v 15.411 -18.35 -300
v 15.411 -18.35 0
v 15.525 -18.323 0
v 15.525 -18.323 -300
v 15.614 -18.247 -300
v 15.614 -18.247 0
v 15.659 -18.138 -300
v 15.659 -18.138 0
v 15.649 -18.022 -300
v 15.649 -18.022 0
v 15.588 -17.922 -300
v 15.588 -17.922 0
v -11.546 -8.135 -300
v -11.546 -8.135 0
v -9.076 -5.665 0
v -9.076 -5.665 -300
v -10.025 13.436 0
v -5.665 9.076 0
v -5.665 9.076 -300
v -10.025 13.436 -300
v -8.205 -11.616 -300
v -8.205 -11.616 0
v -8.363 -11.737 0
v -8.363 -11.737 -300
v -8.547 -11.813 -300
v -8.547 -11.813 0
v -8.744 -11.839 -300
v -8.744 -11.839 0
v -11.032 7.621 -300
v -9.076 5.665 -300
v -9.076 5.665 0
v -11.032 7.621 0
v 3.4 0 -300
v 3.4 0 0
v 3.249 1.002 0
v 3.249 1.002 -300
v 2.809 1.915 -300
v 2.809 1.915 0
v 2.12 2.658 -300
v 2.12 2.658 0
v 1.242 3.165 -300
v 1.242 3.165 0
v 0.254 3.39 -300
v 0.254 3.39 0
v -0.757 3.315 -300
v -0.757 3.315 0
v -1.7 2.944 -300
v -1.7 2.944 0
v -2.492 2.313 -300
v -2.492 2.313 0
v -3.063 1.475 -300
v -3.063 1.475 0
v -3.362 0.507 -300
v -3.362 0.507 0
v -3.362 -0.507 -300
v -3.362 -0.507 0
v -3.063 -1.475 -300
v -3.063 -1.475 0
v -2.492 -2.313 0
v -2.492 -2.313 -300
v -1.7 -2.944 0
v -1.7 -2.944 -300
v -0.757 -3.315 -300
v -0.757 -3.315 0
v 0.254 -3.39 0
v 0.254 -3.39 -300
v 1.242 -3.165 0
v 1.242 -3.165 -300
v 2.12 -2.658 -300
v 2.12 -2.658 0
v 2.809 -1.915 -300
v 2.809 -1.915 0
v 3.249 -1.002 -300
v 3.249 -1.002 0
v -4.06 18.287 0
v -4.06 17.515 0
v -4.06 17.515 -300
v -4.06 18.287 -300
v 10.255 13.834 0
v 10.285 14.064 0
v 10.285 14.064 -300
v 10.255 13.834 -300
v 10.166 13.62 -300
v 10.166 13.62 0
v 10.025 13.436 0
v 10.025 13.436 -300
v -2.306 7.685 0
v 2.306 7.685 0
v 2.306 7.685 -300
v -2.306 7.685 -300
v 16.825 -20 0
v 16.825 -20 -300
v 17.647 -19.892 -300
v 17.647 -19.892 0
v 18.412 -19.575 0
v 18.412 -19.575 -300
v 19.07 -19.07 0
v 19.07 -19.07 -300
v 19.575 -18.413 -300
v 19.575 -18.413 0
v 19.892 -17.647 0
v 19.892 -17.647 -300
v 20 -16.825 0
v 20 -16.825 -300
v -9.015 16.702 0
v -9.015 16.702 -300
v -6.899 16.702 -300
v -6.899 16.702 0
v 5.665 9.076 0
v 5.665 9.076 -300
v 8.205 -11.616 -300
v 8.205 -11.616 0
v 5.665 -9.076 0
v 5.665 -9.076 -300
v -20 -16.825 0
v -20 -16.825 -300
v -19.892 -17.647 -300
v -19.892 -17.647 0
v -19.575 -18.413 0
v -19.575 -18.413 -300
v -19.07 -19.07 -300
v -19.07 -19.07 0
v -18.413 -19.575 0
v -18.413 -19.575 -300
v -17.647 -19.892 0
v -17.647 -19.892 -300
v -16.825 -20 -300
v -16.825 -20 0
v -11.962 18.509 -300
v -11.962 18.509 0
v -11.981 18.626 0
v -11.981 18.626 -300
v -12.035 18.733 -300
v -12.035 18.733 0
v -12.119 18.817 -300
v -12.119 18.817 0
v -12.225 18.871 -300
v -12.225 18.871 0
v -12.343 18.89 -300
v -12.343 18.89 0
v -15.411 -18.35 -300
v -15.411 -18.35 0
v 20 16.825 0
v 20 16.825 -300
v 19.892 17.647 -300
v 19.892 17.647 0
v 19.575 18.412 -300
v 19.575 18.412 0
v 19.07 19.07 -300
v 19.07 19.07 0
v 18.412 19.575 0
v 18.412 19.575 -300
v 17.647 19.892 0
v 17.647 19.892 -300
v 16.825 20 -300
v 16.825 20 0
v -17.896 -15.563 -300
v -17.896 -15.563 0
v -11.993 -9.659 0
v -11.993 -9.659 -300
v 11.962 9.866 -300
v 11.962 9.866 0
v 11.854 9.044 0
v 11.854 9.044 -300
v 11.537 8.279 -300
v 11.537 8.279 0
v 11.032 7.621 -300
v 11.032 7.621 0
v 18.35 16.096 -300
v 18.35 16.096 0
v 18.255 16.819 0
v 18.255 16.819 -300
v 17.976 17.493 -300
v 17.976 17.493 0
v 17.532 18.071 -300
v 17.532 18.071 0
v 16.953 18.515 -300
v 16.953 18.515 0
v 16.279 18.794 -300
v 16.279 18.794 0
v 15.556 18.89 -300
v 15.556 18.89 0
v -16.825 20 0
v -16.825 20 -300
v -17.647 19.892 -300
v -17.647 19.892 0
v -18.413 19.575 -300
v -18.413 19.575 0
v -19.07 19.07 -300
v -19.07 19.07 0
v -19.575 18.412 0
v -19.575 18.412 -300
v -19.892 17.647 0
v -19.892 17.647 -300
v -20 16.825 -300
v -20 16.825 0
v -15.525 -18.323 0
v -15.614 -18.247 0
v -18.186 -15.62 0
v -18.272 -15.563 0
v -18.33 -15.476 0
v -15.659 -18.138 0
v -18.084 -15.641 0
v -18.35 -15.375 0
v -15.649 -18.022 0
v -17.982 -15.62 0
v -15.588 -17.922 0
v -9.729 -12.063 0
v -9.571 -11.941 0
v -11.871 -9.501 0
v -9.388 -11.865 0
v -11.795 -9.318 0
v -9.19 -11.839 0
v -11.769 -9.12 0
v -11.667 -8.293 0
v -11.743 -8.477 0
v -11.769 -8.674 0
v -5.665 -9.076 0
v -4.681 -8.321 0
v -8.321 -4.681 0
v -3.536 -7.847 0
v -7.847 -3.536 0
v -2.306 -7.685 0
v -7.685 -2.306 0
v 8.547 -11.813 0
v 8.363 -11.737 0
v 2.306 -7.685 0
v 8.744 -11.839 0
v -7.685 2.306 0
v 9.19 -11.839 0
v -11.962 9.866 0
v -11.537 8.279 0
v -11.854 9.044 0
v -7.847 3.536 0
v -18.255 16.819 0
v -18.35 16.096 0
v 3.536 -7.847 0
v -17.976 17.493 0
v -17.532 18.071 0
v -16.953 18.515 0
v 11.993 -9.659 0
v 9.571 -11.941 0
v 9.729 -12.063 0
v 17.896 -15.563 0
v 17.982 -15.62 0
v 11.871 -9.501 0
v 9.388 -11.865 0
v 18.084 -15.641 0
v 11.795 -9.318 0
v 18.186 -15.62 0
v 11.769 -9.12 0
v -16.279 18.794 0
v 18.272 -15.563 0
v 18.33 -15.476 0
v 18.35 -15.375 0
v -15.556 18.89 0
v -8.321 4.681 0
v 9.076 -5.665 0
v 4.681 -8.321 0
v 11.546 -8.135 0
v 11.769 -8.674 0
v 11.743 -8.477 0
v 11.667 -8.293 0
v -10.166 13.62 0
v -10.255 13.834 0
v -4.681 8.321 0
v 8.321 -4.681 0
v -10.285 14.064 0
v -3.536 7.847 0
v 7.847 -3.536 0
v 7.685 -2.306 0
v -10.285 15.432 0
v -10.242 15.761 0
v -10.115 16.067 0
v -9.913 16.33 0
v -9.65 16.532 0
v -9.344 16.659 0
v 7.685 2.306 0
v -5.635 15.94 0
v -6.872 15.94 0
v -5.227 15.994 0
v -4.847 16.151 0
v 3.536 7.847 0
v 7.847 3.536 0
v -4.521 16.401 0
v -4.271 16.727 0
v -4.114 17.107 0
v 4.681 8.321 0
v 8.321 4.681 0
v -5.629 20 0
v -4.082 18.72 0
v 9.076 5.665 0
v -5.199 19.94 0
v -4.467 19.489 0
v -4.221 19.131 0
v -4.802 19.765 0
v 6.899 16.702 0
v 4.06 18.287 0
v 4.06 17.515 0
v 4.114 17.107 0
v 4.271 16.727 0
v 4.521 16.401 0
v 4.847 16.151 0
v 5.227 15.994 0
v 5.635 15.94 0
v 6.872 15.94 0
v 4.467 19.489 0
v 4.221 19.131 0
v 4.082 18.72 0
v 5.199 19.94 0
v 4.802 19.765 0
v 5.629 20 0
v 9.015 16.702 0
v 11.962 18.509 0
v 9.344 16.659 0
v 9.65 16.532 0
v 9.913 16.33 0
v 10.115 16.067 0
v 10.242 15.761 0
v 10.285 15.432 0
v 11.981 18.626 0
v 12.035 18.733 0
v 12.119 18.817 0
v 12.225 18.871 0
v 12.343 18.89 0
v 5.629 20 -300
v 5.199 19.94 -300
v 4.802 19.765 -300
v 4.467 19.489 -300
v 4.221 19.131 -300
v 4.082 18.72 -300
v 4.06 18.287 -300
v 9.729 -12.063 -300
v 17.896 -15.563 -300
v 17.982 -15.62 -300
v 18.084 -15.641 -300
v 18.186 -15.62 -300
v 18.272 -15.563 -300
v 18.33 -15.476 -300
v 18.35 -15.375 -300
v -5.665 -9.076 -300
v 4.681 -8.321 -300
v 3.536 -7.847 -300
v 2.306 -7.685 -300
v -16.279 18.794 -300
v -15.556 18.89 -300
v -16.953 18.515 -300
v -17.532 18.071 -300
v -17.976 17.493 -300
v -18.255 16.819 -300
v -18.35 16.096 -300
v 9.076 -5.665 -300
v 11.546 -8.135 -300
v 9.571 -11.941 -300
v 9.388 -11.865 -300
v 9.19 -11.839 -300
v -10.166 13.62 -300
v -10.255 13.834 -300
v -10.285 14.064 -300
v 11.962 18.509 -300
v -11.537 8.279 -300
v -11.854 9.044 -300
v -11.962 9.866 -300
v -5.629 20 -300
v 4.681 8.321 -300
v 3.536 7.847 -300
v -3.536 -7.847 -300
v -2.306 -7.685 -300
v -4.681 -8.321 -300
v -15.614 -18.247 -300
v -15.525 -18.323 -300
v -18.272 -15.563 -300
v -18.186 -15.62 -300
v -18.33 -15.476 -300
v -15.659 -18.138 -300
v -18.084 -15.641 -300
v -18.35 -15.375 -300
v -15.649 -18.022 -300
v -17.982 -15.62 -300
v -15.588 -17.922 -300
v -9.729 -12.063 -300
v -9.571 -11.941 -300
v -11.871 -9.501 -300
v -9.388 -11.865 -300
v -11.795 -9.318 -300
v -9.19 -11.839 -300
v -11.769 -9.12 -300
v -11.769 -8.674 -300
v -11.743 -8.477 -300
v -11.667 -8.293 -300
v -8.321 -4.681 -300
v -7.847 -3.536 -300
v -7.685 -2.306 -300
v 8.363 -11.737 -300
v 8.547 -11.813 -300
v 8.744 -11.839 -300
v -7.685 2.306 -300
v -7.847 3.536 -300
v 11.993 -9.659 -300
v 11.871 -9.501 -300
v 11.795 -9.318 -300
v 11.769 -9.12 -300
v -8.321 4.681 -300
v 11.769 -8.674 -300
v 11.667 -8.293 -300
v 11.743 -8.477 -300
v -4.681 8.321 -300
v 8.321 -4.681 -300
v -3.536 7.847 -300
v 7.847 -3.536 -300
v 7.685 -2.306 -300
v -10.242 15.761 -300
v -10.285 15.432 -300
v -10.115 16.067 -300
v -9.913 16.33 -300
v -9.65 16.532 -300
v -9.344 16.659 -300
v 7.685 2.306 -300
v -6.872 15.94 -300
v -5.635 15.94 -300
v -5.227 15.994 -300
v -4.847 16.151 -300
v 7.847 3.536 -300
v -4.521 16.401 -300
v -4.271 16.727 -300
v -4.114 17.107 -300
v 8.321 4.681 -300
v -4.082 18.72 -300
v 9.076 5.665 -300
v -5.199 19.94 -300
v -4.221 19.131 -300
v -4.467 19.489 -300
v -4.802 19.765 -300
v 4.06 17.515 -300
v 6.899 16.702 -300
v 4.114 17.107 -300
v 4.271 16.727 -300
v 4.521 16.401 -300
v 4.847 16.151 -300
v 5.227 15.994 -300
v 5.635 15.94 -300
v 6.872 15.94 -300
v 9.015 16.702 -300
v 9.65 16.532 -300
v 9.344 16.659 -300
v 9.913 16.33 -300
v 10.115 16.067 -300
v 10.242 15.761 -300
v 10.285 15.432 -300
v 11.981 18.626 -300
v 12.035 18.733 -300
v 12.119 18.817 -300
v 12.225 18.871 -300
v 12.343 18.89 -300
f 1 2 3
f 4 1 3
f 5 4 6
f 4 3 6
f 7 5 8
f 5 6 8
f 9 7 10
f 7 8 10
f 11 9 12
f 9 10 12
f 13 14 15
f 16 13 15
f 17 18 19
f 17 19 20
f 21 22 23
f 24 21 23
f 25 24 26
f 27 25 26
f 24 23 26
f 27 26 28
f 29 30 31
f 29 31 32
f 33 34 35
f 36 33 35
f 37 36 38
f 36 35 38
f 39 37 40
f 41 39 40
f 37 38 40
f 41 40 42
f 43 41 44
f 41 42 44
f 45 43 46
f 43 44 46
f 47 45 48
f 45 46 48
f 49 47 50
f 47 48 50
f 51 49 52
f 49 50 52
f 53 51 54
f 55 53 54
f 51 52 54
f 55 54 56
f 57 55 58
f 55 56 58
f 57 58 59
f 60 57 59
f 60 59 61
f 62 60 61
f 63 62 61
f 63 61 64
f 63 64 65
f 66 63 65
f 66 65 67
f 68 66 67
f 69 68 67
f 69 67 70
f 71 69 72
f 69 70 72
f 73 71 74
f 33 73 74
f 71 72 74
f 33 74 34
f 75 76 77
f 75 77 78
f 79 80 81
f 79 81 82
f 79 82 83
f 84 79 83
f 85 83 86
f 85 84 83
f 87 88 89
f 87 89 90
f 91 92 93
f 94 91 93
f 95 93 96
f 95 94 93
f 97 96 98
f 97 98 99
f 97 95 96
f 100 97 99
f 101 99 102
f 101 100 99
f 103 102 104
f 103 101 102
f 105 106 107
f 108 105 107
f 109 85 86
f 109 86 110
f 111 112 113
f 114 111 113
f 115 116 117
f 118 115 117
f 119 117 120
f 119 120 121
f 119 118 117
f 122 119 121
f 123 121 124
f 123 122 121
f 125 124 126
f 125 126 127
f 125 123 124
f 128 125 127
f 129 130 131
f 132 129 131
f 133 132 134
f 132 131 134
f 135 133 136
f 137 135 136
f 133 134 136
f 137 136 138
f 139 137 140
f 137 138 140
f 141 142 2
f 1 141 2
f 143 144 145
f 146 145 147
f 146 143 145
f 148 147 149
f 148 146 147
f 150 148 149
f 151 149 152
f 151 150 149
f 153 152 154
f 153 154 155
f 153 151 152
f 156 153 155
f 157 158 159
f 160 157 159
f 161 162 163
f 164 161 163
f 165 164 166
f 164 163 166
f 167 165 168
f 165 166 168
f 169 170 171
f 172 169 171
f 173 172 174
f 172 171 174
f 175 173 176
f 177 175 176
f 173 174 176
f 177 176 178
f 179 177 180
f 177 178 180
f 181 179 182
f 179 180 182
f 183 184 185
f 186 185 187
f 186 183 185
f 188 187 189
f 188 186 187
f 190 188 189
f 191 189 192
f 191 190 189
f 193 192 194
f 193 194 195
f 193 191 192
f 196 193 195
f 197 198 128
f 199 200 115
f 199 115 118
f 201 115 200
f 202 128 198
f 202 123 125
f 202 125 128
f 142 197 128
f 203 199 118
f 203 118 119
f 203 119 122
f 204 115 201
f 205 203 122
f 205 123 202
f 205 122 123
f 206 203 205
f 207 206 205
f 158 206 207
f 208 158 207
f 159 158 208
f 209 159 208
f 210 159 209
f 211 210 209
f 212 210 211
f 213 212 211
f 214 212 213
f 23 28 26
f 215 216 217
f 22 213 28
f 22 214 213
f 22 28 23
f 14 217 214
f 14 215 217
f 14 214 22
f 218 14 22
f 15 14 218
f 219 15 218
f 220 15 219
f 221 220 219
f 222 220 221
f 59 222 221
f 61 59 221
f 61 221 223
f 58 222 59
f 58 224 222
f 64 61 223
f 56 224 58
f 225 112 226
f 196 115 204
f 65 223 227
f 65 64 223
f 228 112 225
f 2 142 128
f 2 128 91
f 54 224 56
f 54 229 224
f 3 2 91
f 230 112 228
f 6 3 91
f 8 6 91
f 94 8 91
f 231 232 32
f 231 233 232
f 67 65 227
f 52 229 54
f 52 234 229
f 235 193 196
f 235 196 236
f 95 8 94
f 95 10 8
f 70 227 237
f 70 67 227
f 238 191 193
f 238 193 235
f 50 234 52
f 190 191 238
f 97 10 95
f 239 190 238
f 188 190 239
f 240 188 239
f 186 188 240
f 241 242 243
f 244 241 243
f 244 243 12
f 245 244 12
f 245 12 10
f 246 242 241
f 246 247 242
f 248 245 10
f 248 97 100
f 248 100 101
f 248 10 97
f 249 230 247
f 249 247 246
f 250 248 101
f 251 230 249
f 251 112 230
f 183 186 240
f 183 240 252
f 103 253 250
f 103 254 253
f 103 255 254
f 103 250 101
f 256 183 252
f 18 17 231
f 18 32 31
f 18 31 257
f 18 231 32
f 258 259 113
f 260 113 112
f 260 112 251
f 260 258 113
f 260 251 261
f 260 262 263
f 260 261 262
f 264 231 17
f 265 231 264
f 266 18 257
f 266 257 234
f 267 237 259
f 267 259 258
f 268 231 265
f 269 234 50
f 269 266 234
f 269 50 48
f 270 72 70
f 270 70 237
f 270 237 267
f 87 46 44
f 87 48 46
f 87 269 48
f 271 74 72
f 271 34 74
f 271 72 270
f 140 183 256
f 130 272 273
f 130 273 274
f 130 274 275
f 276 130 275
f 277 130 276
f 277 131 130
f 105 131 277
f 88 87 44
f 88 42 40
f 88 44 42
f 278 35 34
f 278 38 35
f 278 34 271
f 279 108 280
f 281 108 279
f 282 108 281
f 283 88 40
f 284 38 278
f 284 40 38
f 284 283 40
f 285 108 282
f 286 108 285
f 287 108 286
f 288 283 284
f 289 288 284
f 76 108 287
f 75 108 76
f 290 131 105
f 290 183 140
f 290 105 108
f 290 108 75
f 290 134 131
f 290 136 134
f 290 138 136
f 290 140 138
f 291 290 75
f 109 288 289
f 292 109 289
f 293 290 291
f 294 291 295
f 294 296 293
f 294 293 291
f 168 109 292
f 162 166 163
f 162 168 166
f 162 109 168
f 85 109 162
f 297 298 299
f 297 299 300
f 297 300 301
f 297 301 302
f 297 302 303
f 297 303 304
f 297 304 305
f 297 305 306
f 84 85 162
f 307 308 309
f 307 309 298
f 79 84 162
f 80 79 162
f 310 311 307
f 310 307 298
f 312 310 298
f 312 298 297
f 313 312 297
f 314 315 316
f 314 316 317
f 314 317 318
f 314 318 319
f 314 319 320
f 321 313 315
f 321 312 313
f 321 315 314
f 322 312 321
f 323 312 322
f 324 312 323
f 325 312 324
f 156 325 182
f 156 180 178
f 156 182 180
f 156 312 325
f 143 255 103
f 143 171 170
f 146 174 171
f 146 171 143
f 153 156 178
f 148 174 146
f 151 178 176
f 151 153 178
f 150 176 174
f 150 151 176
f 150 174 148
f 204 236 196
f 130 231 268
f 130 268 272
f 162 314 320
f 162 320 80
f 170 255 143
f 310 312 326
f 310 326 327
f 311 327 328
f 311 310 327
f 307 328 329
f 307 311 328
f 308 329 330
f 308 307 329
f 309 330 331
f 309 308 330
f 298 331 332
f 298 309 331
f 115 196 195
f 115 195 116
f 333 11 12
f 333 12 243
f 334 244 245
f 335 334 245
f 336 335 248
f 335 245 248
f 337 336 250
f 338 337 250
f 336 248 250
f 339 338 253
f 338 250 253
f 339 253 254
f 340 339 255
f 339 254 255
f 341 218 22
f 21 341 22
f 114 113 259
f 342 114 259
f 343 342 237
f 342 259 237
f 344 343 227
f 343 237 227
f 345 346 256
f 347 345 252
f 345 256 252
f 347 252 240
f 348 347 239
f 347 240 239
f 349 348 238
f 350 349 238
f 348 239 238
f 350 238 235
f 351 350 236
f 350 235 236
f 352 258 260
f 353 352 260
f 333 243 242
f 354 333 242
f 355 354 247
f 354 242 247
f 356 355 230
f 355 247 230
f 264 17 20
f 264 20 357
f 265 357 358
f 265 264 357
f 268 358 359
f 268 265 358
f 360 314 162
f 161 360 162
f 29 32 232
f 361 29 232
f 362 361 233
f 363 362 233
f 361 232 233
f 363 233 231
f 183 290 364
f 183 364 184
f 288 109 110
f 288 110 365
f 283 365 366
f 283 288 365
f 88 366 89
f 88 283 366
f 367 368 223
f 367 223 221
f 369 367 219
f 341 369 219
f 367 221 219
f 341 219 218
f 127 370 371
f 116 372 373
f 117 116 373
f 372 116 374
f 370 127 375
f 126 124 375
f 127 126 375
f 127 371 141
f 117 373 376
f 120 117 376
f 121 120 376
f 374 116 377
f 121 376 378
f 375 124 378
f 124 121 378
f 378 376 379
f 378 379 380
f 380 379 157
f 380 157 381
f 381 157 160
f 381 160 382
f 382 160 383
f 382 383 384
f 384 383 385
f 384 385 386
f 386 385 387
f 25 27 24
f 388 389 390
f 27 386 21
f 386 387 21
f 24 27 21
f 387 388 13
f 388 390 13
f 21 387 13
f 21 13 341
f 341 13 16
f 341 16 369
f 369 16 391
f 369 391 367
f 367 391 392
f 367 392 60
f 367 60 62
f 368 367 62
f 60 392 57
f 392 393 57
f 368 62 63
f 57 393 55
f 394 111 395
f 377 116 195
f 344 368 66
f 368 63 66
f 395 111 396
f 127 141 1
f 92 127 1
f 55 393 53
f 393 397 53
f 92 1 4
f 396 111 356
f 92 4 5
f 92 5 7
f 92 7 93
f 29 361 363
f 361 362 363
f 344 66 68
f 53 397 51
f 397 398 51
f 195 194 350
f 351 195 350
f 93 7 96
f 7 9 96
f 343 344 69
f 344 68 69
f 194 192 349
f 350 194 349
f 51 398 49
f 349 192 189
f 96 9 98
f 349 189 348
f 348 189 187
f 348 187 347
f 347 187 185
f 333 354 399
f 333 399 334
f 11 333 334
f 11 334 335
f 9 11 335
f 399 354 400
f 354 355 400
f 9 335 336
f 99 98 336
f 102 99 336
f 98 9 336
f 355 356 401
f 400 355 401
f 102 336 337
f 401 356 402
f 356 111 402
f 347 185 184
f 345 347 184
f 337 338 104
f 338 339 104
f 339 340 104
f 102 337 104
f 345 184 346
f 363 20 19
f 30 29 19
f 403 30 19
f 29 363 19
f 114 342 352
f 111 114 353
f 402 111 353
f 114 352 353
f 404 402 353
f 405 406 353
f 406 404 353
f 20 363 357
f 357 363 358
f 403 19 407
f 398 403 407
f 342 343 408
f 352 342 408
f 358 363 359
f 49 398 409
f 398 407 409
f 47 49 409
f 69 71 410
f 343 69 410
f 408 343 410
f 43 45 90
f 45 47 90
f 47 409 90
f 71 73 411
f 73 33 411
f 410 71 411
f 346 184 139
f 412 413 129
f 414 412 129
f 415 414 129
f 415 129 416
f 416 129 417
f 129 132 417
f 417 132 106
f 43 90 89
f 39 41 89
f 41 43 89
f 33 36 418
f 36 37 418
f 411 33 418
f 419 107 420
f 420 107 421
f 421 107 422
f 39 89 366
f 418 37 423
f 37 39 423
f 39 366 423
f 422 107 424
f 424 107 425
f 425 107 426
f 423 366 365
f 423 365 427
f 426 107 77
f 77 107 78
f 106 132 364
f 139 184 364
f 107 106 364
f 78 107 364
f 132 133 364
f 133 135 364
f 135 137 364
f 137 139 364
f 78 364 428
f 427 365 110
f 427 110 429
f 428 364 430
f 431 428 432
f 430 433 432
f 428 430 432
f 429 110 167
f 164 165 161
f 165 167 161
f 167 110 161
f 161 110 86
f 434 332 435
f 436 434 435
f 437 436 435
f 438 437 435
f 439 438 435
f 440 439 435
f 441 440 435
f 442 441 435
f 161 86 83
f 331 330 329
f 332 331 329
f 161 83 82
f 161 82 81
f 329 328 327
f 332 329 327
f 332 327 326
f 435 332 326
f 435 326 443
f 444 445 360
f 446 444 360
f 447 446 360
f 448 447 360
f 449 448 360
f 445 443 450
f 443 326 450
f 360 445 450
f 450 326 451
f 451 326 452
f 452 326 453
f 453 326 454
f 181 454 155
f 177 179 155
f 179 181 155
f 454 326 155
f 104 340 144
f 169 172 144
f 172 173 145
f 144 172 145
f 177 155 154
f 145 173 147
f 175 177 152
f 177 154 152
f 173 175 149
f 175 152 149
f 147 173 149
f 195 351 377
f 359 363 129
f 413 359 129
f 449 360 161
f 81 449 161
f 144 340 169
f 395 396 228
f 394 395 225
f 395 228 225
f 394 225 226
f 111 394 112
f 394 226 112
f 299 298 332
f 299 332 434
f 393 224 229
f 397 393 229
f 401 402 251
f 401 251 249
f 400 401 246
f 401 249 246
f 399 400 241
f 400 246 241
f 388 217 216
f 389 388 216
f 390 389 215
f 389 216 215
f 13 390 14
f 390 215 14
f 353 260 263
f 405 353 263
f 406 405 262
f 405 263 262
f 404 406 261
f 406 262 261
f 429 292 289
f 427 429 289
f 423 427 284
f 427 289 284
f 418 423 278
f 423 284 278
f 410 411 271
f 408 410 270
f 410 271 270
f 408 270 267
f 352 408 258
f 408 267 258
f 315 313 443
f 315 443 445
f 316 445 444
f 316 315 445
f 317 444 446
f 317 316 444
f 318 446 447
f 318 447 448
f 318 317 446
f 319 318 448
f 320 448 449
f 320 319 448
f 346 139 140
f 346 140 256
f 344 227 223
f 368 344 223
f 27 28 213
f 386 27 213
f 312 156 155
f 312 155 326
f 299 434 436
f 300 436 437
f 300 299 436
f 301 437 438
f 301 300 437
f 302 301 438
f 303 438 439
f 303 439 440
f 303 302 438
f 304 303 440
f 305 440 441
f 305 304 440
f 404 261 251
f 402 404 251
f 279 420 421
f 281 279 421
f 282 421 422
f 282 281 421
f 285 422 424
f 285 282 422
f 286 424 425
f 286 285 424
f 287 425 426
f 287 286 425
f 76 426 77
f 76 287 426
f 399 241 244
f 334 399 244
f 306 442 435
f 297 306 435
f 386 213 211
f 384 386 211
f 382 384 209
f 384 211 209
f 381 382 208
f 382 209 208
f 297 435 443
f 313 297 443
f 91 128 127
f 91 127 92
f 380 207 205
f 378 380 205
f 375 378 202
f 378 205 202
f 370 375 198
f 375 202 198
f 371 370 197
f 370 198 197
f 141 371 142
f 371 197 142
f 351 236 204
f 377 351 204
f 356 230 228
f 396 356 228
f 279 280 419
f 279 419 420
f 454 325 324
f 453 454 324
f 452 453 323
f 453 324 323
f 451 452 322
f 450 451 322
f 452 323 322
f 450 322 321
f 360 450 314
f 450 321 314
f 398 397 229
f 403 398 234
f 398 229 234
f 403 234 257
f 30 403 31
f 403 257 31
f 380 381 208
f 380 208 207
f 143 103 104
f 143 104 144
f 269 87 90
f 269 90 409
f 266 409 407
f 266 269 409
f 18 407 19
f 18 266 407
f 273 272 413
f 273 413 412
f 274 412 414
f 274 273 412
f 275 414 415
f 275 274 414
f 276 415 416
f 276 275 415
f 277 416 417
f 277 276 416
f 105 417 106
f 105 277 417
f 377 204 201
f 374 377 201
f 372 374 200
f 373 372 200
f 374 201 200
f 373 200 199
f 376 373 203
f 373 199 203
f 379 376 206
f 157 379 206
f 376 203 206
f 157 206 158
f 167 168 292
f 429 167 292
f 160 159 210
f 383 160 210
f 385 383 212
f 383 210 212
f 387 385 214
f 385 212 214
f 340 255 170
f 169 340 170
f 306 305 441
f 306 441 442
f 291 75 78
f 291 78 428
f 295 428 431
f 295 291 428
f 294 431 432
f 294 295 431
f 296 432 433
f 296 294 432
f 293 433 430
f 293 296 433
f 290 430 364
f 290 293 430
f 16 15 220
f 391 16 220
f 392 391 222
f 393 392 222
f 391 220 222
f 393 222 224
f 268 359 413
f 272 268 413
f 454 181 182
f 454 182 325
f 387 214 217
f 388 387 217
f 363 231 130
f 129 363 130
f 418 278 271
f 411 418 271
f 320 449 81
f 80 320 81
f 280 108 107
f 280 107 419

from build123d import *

# Parameters (mm, degrees)
SKETCH1_R      = 3.4
EXTRUDE1_DEPTH = 300


with BuildPart() as part:
    # Sketch1 → Extrude1 (new body)
    with BuildSketch(Plane.XY):
        with BuildLine():
            Line((16.824999974, 19.999999706), (5.628698889, 19.999999706))
            ThreePointArc((5.628698889, 19.999999706), (4.46721611, 19.488662348), (4.059999948, 18.286712625))
            Line((4.059999948, 18.286712625), (4.059999948, 17.5148))
            ThreePointArc((4.059999948, 17.5148), (4.521248189, 16.401248241), (5.634799948, 15.94))
            Line((5.634799948, 15.94), (6.872423693, 15.94))
            Line((6.872423693, 15.94), (6.899033319, 16.702000002))
            Line((6.899033319, 16.702000002), (9.014999977, 16.702000002))
            ThreePointArc((9.014999977, 16.702000002), (9.913025591, 16.330025613), (10.28499998, 15.431999998))
            Line((10.28499998, 15.431999998), (10.28499998, 14.064318961))
            ThreePointArc((10.28499998, 14.064318961), (10.217328883, 13.724113383), (10.024617903, 13.435701022))
            Line((10.024617903, 13.435701022), (5.665101027, 9.076184193))
            ThreePointArc((5.665101027, 9.076184193), (4.124155011, 8.046556992), (2.306485256, 7.685))
            Line((2.306485256, 7.685), (-2.306485308, 7.685))
            ThreePointArc((-2.306485308, 7.685), (-4.124155063, 8.046556992), (-5.665101079, 9.076184193))
            Line((-5.665101079, 9.076184193), (-10.024617955, 13.435701022))
            ThreePointArc((-10.024617955, 13.435701022), (-10.217328935, 13.724113383), (-10.285000032, 14.064318961))
            Line((-10.285000032, 14.064318961), (-10.285000032, 15.431999998))
            ThreePointArc((-10.285000032, 15.431999998), (-9.913025643, 16.330025613), (-9.015000029, 16.702000002))
            Line((-9.015000029, 16.702000002), (-6.899033371, 16.702000002))
            Line((-6.899033371, 16.702000002), (-6.872423745, 15.94))
            Line((-6.872423745, 15.94), (-5.6348, 15.94))
            ThreePointArc((-5.6348, 15.94), (-4.521248241, 16.401248241), (-4.06, 17.5148))
            Line((-4.06, 17.5148), (-4.06, 18.286712625))
            ThreePointArc((-4.06, 18.286712625), (-4.467216162, 19.488662348), (-5.628698941, 19.999999706))
            Line((-5.628698941, 19.999999706), (-16.825000026, 19.999999706))
            ThreePointArc((-16.825000026, 19.999999706), (-19.070064069, 19.070063731), (-20.000000044, 16.824999688))
            Line((-20.000000044, 16.824999688), (-20.000000044, -16.825000312))
            ThreePointArc((-20.000000044, -16.825000312), (-19.070064069, -19.070064355), (-16.825000026, -20.00000033))
            Line((-16.825000026, -20.00000033), (16.824999974, -20.00000033))
            ThreePointArc((16.824999974, -20.00000033), (19.070064017, -19.070064355), (19.999999992, -16.825000312))
            Line((19.999999992, -16.825000312), (19.999999992, 16.824999688))
            ThreePointArc((19.999999992, 16.824999688), (19.070064017, 19.070063731), (16.824999974, 19.999999706))
        make_face()
        Circle(SKETCH1_R, mode=Mode.SUBTRACT)
        with BuildLine():
            Line((-7.685000123, -2.306485221), (-7.685000123, 2.306485342))
            ThreePointArc((-7.685000123, 2.306485342), (-8.046557115, 4.124155098), (-9.076184316, 5.665101114))
            Line((-9.076184316, 5.665101114), (-11.032179452, 7.621096271))
            ThreePointArc((-11.032179452, 7.621096271), (-11.720432933, 8.651140405), (-11.962115415, 9.866160302))
            Line((-11.962115415, 9.866160302), (-11.962115415, 18.508608264))
            ThreePointArc((-11.962115415, 18.508608264), (-12.073707729, 18.778015942), (-12.343115407, 18.889608256))
            Line((-12.343115407, 18.889608256), (-15.556000031, 18.889608256))
            ThreePointArc((-15.556000031, 18.889608256), (-17.53165638, 18.071264601), (-18.350000035, 16.095608252))
            Line((-18.350000035, 16.095608252), (-18.350000035, -15.374719595))
            ThreePointArc((-18.350000035, -15.374719595), (-18.185883968, -15.620336647), (-17.8961589, -15.562706749))
            Line((-17.8961589, -15.562706749), (-11.992569935, -9.659117847))
            ThreePointArc((-11.992569935, -9.659117847), (-11.827389014, -9.411907131), (-11.769385188, -9.120302208))
            Line((-11.769385188, -9.120302208), (-11.769385188, -8.67393273))
            ThreePointArc((-11.769385188, -8.67393273), (-11.711381362, -8.382327807), (-11.546200441, -8.135117091))
            Line((-11.546200441, -8.135117091), (-9.076184352, -5.665101029))
            ThreePointArc((-9.076184352, -5.665101029), (-8.046557124, -4.124155), (-7.685000123, -2.306485221))
        make_face(mode=Mode.SUBTRACT)
        with BuildLine():
            Line((11.769385136, -8.67393273), (11.769385136, -9.120302208))
            ThreePointArc((11.769385136, -9.120302208), (11.827388962, -9.411907131), (11.992569883, -9.659117847))
            Line((11.992569883, -9.659117847), (17.896158848, -15.562706749))
            ThreePointArc((17.896158848, -15.562706749), (18.185883916, -15.620336647), (18.349999983, -15.374719595))
            Line((18.349999983, -15.374719595), (18.349999983, 16.095608252))
            ThreePointArc((18.349999983, 16.095608252), (17.531656328, 18.071264601), (15.555999979, 18.889608256))
            Line((15.555999979, 18.889608256), (12.343115355, 18.889608256))
            ThreePointArc((12.343115355, 18.889608256), (12.073707677, 18.778015942), (11.962115363, 18.508608264))
            Line((11.962115363, 18.508608264), (11.962115363, 9.866160302))
            ThreePointArc((11.962115363, 9.866160302), (11.720432881, 8.651140405), (11.0321794, 7.621096271))
            Line((11.0321794, 7.621096271), (9.076184264, 5.665101114))
            ThreePointArc((9.076184264, 5.665101114), (8.046557063, 4.124155098), (7.685000071, 2.306485342))
            Line((7.685000071, 2.306485342), (7.685000071, -2.306485221))
            ThreePointArc((7.685000071, -2.306485221), (8.046557072, -4.124155), (9.0761843, -5.665101029))
            Line((9.0761843, -5.665101029), (11.546200389, -8.135117091))
            ThreePointArc((11.546200389, -8.135117091), (11.71138131, -8.382327807), (11.769385136, -8.67393273))
        make_face(mode=Mode.SUBTRACT)
        with BuildLine():
            Line((15.588203795, -17.921655982), (9.729110898, -12.062563022))
            ThreePointArc((9.729110898, -12.062563022), (9.481900182, -11.897382101), (9.190295259, -11.839378275))
            Line((9.190295259, -11.839378275), (8.743925781, -11.839378275))
            ThreePointArc((8.743925781, -11.839378275), (8.452320858, -11.781374449), (8.205110142, -11.616193528))
            Line((8.205110142, -11.616193528), (5.665101063, -9.076184423))
            ThreePointArc((5.665101063, -9.076184423), (4.124155035, -8.046557195), (2.306485256, -7.685000194))
            Line((2.306485256, -7.685000194), (-2.306485308, -7.685000194))
            ThreePointArc((-2.306485308, -7.685000194), (-4.124155087, -8.046557195), (-5.665101115, -9.076184423))
            Line((-5.665101115, -9.076184423), (-8.205110194, -11.616193528))
            ThreePointArc((-8.205110194, -11.616193528), (-8.45232091, -11.781374449), (-8.743925833, -11.839378275))
            Line((-8.743925833, -11.839378275), (-9.190295311, -11.839378275))
            ThreePointArc((-9.190295311, -11.839378275), (-9.481900233, -11.897382101), (-9.72911095, -12.062563022))
            Line((-9.72911095, -12.062563022), (-15.588203847, -17.921655982))
            ThreePointArc((-15.588203847, -17.921655982), (-15.64259606, -18.195104108), (-15.410777932, -18.350000028))
            Line((-15.410777932, -18.350000028), (15.41077788, -18.350000028))
            ThreePointArc((15.41077788, -18.350000028), (15.642596008, -18.195104108), (15.588203795, -17.921655982))
        make_face(mode=Mode.SUBTRACT)
    extrude(amount=-EXTRUDE1_DEPTH)


solid = part.part
